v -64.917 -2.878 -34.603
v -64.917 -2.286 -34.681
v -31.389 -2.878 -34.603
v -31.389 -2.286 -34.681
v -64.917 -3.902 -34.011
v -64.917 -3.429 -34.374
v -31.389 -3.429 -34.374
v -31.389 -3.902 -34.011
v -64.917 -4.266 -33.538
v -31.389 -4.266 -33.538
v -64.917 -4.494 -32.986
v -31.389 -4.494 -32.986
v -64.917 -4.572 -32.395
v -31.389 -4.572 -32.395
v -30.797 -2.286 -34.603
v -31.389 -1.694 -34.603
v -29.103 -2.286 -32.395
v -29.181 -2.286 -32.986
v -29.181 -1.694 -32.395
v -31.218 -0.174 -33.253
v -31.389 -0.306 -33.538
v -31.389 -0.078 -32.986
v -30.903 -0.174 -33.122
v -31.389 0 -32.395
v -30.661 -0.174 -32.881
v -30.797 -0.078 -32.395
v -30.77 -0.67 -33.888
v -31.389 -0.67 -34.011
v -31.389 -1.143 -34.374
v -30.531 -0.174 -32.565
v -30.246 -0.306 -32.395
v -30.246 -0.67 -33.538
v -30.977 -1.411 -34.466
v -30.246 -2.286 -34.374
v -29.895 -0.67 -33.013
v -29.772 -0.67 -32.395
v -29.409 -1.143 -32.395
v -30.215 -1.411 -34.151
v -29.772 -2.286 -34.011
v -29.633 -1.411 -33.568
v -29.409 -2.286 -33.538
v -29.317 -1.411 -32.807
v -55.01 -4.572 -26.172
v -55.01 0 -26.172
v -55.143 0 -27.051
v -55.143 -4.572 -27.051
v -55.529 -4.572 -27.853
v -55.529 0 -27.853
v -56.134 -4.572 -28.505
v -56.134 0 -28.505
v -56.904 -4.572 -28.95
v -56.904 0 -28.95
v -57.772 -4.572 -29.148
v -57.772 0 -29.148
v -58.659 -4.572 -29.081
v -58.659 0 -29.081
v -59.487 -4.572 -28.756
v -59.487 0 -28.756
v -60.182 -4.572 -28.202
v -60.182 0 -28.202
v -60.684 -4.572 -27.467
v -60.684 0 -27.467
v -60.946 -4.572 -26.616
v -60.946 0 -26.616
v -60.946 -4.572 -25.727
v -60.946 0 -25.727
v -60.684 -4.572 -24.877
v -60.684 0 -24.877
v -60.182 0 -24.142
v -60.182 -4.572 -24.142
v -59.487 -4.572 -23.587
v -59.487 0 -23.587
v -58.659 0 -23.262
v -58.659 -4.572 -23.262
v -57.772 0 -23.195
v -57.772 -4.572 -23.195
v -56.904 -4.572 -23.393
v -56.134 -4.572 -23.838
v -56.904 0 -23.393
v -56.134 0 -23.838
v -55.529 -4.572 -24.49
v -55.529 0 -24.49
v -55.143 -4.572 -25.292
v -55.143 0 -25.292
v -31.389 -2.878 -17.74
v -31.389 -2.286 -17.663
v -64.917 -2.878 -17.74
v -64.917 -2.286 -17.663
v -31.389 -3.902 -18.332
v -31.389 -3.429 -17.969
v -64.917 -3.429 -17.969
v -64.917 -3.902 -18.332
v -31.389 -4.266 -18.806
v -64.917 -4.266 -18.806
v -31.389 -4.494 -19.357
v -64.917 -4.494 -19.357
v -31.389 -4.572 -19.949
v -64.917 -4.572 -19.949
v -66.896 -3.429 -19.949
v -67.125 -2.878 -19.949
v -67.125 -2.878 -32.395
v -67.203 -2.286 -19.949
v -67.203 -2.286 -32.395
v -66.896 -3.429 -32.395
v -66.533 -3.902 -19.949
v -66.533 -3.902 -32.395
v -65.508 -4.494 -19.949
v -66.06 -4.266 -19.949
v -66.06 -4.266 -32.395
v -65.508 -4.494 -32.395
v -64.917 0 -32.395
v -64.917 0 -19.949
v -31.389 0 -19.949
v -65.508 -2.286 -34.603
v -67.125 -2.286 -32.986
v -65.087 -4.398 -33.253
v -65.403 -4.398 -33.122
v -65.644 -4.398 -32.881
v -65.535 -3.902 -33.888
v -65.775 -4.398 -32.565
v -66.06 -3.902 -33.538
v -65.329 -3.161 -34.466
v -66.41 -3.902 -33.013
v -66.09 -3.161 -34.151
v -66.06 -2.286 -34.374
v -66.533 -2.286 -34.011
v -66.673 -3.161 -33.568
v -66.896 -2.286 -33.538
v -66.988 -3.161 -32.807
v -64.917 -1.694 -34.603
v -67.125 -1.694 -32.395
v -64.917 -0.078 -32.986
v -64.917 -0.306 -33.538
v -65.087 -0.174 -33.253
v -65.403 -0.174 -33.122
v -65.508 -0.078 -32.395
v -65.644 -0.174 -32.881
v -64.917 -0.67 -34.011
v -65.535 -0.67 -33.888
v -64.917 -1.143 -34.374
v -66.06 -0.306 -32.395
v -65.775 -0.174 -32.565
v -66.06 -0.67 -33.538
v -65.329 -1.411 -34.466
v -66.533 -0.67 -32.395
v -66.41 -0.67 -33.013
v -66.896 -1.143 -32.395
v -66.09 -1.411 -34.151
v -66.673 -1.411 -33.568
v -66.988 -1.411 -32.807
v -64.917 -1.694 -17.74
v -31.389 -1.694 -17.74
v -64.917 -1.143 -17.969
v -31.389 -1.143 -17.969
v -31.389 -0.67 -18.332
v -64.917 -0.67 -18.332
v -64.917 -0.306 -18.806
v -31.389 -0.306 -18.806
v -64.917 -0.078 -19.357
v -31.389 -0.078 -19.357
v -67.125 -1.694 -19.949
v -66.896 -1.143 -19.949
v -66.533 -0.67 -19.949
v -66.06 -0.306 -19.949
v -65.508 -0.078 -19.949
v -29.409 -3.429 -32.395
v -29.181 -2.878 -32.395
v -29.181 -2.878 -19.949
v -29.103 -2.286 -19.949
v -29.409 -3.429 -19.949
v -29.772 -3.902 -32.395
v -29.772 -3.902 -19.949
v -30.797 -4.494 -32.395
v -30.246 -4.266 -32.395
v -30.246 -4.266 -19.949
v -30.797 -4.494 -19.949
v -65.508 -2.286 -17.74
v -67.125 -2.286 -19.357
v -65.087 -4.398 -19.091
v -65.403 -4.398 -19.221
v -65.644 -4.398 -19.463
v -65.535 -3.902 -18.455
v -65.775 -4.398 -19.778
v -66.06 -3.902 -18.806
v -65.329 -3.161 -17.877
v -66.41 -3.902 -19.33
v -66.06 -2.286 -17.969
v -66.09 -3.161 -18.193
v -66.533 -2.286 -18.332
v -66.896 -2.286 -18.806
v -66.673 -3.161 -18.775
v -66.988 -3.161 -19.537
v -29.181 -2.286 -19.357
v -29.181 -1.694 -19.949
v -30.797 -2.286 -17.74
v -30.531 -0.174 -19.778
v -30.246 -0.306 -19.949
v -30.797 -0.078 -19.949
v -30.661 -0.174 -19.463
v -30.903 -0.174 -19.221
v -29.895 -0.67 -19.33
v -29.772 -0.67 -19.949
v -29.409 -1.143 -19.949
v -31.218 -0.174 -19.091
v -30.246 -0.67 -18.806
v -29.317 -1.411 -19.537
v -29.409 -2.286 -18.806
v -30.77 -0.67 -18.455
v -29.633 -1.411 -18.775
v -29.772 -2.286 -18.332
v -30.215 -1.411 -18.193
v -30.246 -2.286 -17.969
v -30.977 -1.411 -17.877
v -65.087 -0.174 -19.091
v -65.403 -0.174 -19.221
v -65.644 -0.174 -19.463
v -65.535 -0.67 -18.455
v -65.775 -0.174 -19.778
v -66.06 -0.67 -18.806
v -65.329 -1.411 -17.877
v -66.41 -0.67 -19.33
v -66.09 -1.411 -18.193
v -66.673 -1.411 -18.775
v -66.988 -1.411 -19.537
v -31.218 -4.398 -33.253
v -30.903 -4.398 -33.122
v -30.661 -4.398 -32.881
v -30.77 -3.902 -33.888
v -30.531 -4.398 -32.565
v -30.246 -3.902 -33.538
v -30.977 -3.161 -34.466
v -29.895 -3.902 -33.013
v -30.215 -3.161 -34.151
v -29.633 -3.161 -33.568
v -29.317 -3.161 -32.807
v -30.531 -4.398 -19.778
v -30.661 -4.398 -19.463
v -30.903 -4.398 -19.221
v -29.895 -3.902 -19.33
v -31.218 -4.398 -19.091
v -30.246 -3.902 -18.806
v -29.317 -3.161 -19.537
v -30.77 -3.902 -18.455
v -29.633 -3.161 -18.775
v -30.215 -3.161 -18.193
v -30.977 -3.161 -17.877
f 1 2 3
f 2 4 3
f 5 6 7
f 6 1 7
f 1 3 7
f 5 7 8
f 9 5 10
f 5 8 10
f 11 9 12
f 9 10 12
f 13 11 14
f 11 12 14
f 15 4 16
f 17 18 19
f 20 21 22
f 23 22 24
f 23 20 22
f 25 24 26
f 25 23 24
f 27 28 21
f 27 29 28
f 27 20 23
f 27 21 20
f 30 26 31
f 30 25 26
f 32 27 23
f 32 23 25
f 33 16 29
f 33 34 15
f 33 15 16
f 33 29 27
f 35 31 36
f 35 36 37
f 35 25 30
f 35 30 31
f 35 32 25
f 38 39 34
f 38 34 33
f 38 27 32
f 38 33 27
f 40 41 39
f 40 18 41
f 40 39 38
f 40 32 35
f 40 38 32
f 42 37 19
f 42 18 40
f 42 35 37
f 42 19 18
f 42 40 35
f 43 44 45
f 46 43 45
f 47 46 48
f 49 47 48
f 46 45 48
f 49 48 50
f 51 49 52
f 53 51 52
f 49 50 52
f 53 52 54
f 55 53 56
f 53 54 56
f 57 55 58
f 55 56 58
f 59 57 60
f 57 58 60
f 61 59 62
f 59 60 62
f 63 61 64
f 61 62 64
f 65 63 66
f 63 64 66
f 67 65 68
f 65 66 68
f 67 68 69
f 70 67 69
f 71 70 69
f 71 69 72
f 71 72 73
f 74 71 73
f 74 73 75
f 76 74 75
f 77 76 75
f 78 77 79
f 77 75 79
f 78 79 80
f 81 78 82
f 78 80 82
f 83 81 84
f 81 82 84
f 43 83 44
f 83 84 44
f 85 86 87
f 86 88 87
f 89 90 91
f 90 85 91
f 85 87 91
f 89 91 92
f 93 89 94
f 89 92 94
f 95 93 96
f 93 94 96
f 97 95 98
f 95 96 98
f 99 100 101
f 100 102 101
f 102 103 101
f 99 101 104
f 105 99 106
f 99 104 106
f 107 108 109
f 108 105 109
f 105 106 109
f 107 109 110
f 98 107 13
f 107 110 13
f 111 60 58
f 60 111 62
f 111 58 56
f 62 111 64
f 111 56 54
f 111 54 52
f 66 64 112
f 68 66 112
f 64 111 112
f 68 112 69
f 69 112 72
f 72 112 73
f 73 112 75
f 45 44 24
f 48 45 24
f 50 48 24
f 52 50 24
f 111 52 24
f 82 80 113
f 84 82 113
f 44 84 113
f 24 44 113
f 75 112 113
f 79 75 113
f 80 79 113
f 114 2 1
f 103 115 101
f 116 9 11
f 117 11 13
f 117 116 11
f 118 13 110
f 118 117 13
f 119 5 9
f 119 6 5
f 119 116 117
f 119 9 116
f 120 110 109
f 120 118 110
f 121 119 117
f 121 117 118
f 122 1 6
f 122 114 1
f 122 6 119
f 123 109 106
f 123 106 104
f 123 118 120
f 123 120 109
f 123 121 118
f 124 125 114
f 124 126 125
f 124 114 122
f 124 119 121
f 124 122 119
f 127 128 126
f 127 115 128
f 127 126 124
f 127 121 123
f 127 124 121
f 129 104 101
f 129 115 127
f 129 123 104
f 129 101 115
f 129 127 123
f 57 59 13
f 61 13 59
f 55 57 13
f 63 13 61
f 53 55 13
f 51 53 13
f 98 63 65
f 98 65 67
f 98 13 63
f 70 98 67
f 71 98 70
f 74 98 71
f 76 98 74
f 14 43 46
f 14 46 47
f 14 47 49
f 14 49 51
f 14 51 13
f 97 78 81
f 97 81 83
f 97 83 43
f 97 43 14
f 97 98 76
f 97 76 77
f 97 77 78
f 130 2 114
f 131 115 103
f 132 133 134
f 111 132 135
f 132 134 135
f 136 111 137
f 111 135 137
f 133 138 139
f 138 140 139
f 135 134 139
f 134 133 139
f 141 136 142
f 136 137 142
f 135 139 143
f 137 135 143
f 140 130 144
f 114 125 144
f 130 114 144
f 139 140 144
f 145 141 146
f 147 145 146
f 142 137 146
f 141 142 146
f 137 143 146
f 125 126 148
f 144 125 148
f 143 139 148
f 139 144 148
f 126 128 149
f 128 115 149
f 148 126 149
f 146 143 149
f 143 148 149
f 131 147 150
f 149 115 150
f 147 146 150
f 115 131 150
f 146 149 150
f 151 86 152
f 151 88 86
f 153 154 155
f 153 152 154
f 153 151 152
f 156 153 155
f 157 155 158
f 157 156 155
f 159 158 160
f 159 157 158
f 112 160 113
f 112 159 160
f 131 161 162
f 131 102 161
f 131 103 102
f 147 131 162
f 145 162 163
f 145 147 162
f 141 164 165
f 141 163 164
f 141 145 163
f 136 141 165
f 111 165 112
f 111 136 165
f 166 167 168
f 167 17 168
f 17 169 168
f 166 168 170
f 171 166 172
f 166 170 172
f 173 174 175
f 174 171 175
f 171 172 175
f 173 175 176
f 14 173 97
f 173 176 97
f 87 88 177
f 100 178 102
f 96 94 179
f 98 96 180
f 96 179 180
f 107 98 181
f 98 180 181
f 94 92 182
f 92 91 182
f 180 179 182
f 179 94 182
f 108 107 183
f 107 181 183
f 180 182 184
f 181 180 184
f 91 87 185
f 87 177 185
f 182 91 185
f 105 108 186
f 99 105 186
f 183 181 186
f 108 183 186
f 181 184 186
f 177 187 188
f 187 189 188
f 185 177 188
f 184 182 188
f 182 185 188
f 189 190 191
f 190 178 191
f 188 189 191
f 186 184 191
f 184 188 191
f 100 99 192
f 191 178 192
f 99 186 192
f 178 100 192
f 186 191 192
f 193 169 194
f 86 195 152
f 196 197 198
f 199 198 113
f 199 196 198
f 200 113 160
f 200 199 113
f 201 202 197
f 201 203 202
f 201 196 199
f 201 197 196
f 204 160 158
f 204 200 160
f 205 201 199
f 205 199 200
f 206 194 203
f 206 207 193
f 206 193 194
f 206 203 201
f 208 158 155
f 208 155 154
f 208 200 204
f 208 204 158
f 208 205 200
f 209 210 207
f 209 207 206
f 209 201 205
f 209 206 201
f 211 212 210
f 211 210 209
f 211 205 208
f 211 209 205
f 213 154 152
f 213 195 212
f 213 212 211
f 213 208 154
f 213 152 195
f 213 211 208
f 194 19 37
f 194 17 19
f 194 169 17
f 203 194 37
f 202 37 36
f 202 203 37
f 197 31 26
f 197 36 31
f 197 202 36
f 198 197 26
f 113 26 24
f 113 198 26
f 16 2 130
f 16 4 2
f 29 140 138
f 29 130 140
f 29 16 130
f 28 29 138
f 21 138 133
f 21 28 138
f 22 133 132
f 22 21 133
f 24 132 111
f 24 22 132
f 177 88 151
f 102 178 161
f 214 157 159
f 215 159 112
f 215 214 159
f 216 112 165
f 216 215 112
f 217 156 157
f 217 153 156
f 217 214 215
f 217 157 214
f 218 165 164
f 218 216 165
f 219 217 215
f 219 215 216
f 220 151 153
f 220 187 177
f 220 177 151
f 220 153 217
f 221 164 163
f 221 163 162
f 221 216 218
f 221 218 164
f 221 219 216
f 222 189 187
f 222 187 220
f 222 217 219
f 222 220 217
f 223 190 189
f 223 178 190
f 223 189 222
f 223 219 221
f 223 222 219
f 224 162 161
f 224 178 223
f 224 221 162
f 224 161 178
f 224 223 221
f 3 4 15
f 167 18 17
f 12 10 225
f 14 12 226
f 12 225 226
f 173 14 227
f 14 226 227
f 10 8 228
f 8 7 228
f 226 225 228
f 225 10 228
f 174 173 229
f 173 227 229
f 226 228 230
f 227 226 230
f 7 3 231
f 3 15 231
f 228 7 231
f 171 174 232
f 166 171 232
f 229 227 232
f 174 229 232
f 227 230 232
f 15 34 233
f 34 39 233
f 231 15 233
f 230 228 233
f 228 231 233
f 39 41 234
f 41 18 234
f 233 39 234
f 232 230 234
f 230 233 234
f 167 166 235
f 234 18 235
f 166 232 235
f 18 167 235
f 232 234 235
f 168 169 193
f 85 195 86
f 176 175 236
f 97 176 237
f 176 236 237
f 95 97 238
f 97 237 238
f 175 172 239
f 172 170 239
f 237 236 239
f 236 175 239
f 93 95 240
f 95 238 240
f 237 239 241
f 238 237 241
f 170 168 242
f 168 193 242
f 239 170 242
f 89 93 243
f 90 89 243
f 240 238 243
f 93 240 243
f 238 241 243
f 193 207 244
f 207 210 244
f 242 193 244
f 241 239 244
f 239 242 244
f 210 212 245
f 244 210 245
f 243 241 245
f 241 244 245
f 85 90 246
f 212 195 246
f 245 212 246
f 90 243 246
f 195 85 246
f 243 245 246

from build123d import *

# Parameters (mm, degrees)
F1_DEPTH = 4.572
F2_R     = 2.28599


# Not quite as in the source:
# - a fillet or chamfer is up to 0.001 mm smaller than in the source, because OpenCascade refuses the exact size


with BuildPart() as f1:
    # F0 (on Front) → F1 (new body)
    with BuildSketch(Plane.XZ):
        with BuildLine():
            Line((-29.10264256, -17.6625937588), (-67.20264256, -17.6625937588))
            Line((-67.20264256, -17.6625937588), (-67.20264256, -26.1715937588))
            Line((-67.20264256, -26.1715937588), (-60.9790929348, -26.1715937588))
            ThreePointArc((-60.9790929348, -26.1715937588), (-57.9945929348, -23.1870937588), (-55.0100929348, -26.1715937588))
            Line((-55.0100929348, -26.1715937588), (-29.10264256, -26.1715937588))
            Line((-29.10264256, -26.1715937588), (-29.10264256, -17.6625937588))
        make_face()
        with BuildLine():
            Line((-60.9790929348, -26.1715937588), (-67.20264256, -26.1715937588))
            Line((-67.20264256, -26.1715937588), (-67.20264256, -34.6805937588))
            Line((-67.20264256, -34.6805937588), (-29.10264256, -34.6805937588))
            Line((-29.10264256, -34.6805937588), (-29.10264256, -26.1715937588))
            Line((-29.10264256, -26.1715937588), (-55.0100929348, -26.1715937588))
            ThreePointArc((-55.0100929348, -26.1715937588), (-57.9945929348, -29.1560937588), (-60.9790929348, -26.1715937588))
        make_face()
    extrude(amount=F1_DEPTH)

    # F2 (radius 2.286 in the source; OpenCascade refuses exactly that, so slightly less here)
    f2_edges = [f1.edges().sort_by_distance(p)[0] for p in [
        (-67.202643, -2.286, -17.662594),
        (-29.102643, -2.286, -17.662594),
        (-29.102643, -2.286, -34.680594),
        (-67.202643, -2.286, -34.680594),
        (-48.152643, -4.572, -34.680594),
        (-48.152643, 0, -34.680594),
        (-29.102643, 0, -26.171594),
        (-29.102643, -4.572, -26.171594),
        (-48.152643, -4.572, -17.662594),
        (-48.152643, 0, -17.662594),
        (-67.202643, 0, -26.171594),
        (-67.202643, -4.572, -26.171594),
    ]]
    fillet(f2_edges, radius=F2_R)


solid = f1.part
